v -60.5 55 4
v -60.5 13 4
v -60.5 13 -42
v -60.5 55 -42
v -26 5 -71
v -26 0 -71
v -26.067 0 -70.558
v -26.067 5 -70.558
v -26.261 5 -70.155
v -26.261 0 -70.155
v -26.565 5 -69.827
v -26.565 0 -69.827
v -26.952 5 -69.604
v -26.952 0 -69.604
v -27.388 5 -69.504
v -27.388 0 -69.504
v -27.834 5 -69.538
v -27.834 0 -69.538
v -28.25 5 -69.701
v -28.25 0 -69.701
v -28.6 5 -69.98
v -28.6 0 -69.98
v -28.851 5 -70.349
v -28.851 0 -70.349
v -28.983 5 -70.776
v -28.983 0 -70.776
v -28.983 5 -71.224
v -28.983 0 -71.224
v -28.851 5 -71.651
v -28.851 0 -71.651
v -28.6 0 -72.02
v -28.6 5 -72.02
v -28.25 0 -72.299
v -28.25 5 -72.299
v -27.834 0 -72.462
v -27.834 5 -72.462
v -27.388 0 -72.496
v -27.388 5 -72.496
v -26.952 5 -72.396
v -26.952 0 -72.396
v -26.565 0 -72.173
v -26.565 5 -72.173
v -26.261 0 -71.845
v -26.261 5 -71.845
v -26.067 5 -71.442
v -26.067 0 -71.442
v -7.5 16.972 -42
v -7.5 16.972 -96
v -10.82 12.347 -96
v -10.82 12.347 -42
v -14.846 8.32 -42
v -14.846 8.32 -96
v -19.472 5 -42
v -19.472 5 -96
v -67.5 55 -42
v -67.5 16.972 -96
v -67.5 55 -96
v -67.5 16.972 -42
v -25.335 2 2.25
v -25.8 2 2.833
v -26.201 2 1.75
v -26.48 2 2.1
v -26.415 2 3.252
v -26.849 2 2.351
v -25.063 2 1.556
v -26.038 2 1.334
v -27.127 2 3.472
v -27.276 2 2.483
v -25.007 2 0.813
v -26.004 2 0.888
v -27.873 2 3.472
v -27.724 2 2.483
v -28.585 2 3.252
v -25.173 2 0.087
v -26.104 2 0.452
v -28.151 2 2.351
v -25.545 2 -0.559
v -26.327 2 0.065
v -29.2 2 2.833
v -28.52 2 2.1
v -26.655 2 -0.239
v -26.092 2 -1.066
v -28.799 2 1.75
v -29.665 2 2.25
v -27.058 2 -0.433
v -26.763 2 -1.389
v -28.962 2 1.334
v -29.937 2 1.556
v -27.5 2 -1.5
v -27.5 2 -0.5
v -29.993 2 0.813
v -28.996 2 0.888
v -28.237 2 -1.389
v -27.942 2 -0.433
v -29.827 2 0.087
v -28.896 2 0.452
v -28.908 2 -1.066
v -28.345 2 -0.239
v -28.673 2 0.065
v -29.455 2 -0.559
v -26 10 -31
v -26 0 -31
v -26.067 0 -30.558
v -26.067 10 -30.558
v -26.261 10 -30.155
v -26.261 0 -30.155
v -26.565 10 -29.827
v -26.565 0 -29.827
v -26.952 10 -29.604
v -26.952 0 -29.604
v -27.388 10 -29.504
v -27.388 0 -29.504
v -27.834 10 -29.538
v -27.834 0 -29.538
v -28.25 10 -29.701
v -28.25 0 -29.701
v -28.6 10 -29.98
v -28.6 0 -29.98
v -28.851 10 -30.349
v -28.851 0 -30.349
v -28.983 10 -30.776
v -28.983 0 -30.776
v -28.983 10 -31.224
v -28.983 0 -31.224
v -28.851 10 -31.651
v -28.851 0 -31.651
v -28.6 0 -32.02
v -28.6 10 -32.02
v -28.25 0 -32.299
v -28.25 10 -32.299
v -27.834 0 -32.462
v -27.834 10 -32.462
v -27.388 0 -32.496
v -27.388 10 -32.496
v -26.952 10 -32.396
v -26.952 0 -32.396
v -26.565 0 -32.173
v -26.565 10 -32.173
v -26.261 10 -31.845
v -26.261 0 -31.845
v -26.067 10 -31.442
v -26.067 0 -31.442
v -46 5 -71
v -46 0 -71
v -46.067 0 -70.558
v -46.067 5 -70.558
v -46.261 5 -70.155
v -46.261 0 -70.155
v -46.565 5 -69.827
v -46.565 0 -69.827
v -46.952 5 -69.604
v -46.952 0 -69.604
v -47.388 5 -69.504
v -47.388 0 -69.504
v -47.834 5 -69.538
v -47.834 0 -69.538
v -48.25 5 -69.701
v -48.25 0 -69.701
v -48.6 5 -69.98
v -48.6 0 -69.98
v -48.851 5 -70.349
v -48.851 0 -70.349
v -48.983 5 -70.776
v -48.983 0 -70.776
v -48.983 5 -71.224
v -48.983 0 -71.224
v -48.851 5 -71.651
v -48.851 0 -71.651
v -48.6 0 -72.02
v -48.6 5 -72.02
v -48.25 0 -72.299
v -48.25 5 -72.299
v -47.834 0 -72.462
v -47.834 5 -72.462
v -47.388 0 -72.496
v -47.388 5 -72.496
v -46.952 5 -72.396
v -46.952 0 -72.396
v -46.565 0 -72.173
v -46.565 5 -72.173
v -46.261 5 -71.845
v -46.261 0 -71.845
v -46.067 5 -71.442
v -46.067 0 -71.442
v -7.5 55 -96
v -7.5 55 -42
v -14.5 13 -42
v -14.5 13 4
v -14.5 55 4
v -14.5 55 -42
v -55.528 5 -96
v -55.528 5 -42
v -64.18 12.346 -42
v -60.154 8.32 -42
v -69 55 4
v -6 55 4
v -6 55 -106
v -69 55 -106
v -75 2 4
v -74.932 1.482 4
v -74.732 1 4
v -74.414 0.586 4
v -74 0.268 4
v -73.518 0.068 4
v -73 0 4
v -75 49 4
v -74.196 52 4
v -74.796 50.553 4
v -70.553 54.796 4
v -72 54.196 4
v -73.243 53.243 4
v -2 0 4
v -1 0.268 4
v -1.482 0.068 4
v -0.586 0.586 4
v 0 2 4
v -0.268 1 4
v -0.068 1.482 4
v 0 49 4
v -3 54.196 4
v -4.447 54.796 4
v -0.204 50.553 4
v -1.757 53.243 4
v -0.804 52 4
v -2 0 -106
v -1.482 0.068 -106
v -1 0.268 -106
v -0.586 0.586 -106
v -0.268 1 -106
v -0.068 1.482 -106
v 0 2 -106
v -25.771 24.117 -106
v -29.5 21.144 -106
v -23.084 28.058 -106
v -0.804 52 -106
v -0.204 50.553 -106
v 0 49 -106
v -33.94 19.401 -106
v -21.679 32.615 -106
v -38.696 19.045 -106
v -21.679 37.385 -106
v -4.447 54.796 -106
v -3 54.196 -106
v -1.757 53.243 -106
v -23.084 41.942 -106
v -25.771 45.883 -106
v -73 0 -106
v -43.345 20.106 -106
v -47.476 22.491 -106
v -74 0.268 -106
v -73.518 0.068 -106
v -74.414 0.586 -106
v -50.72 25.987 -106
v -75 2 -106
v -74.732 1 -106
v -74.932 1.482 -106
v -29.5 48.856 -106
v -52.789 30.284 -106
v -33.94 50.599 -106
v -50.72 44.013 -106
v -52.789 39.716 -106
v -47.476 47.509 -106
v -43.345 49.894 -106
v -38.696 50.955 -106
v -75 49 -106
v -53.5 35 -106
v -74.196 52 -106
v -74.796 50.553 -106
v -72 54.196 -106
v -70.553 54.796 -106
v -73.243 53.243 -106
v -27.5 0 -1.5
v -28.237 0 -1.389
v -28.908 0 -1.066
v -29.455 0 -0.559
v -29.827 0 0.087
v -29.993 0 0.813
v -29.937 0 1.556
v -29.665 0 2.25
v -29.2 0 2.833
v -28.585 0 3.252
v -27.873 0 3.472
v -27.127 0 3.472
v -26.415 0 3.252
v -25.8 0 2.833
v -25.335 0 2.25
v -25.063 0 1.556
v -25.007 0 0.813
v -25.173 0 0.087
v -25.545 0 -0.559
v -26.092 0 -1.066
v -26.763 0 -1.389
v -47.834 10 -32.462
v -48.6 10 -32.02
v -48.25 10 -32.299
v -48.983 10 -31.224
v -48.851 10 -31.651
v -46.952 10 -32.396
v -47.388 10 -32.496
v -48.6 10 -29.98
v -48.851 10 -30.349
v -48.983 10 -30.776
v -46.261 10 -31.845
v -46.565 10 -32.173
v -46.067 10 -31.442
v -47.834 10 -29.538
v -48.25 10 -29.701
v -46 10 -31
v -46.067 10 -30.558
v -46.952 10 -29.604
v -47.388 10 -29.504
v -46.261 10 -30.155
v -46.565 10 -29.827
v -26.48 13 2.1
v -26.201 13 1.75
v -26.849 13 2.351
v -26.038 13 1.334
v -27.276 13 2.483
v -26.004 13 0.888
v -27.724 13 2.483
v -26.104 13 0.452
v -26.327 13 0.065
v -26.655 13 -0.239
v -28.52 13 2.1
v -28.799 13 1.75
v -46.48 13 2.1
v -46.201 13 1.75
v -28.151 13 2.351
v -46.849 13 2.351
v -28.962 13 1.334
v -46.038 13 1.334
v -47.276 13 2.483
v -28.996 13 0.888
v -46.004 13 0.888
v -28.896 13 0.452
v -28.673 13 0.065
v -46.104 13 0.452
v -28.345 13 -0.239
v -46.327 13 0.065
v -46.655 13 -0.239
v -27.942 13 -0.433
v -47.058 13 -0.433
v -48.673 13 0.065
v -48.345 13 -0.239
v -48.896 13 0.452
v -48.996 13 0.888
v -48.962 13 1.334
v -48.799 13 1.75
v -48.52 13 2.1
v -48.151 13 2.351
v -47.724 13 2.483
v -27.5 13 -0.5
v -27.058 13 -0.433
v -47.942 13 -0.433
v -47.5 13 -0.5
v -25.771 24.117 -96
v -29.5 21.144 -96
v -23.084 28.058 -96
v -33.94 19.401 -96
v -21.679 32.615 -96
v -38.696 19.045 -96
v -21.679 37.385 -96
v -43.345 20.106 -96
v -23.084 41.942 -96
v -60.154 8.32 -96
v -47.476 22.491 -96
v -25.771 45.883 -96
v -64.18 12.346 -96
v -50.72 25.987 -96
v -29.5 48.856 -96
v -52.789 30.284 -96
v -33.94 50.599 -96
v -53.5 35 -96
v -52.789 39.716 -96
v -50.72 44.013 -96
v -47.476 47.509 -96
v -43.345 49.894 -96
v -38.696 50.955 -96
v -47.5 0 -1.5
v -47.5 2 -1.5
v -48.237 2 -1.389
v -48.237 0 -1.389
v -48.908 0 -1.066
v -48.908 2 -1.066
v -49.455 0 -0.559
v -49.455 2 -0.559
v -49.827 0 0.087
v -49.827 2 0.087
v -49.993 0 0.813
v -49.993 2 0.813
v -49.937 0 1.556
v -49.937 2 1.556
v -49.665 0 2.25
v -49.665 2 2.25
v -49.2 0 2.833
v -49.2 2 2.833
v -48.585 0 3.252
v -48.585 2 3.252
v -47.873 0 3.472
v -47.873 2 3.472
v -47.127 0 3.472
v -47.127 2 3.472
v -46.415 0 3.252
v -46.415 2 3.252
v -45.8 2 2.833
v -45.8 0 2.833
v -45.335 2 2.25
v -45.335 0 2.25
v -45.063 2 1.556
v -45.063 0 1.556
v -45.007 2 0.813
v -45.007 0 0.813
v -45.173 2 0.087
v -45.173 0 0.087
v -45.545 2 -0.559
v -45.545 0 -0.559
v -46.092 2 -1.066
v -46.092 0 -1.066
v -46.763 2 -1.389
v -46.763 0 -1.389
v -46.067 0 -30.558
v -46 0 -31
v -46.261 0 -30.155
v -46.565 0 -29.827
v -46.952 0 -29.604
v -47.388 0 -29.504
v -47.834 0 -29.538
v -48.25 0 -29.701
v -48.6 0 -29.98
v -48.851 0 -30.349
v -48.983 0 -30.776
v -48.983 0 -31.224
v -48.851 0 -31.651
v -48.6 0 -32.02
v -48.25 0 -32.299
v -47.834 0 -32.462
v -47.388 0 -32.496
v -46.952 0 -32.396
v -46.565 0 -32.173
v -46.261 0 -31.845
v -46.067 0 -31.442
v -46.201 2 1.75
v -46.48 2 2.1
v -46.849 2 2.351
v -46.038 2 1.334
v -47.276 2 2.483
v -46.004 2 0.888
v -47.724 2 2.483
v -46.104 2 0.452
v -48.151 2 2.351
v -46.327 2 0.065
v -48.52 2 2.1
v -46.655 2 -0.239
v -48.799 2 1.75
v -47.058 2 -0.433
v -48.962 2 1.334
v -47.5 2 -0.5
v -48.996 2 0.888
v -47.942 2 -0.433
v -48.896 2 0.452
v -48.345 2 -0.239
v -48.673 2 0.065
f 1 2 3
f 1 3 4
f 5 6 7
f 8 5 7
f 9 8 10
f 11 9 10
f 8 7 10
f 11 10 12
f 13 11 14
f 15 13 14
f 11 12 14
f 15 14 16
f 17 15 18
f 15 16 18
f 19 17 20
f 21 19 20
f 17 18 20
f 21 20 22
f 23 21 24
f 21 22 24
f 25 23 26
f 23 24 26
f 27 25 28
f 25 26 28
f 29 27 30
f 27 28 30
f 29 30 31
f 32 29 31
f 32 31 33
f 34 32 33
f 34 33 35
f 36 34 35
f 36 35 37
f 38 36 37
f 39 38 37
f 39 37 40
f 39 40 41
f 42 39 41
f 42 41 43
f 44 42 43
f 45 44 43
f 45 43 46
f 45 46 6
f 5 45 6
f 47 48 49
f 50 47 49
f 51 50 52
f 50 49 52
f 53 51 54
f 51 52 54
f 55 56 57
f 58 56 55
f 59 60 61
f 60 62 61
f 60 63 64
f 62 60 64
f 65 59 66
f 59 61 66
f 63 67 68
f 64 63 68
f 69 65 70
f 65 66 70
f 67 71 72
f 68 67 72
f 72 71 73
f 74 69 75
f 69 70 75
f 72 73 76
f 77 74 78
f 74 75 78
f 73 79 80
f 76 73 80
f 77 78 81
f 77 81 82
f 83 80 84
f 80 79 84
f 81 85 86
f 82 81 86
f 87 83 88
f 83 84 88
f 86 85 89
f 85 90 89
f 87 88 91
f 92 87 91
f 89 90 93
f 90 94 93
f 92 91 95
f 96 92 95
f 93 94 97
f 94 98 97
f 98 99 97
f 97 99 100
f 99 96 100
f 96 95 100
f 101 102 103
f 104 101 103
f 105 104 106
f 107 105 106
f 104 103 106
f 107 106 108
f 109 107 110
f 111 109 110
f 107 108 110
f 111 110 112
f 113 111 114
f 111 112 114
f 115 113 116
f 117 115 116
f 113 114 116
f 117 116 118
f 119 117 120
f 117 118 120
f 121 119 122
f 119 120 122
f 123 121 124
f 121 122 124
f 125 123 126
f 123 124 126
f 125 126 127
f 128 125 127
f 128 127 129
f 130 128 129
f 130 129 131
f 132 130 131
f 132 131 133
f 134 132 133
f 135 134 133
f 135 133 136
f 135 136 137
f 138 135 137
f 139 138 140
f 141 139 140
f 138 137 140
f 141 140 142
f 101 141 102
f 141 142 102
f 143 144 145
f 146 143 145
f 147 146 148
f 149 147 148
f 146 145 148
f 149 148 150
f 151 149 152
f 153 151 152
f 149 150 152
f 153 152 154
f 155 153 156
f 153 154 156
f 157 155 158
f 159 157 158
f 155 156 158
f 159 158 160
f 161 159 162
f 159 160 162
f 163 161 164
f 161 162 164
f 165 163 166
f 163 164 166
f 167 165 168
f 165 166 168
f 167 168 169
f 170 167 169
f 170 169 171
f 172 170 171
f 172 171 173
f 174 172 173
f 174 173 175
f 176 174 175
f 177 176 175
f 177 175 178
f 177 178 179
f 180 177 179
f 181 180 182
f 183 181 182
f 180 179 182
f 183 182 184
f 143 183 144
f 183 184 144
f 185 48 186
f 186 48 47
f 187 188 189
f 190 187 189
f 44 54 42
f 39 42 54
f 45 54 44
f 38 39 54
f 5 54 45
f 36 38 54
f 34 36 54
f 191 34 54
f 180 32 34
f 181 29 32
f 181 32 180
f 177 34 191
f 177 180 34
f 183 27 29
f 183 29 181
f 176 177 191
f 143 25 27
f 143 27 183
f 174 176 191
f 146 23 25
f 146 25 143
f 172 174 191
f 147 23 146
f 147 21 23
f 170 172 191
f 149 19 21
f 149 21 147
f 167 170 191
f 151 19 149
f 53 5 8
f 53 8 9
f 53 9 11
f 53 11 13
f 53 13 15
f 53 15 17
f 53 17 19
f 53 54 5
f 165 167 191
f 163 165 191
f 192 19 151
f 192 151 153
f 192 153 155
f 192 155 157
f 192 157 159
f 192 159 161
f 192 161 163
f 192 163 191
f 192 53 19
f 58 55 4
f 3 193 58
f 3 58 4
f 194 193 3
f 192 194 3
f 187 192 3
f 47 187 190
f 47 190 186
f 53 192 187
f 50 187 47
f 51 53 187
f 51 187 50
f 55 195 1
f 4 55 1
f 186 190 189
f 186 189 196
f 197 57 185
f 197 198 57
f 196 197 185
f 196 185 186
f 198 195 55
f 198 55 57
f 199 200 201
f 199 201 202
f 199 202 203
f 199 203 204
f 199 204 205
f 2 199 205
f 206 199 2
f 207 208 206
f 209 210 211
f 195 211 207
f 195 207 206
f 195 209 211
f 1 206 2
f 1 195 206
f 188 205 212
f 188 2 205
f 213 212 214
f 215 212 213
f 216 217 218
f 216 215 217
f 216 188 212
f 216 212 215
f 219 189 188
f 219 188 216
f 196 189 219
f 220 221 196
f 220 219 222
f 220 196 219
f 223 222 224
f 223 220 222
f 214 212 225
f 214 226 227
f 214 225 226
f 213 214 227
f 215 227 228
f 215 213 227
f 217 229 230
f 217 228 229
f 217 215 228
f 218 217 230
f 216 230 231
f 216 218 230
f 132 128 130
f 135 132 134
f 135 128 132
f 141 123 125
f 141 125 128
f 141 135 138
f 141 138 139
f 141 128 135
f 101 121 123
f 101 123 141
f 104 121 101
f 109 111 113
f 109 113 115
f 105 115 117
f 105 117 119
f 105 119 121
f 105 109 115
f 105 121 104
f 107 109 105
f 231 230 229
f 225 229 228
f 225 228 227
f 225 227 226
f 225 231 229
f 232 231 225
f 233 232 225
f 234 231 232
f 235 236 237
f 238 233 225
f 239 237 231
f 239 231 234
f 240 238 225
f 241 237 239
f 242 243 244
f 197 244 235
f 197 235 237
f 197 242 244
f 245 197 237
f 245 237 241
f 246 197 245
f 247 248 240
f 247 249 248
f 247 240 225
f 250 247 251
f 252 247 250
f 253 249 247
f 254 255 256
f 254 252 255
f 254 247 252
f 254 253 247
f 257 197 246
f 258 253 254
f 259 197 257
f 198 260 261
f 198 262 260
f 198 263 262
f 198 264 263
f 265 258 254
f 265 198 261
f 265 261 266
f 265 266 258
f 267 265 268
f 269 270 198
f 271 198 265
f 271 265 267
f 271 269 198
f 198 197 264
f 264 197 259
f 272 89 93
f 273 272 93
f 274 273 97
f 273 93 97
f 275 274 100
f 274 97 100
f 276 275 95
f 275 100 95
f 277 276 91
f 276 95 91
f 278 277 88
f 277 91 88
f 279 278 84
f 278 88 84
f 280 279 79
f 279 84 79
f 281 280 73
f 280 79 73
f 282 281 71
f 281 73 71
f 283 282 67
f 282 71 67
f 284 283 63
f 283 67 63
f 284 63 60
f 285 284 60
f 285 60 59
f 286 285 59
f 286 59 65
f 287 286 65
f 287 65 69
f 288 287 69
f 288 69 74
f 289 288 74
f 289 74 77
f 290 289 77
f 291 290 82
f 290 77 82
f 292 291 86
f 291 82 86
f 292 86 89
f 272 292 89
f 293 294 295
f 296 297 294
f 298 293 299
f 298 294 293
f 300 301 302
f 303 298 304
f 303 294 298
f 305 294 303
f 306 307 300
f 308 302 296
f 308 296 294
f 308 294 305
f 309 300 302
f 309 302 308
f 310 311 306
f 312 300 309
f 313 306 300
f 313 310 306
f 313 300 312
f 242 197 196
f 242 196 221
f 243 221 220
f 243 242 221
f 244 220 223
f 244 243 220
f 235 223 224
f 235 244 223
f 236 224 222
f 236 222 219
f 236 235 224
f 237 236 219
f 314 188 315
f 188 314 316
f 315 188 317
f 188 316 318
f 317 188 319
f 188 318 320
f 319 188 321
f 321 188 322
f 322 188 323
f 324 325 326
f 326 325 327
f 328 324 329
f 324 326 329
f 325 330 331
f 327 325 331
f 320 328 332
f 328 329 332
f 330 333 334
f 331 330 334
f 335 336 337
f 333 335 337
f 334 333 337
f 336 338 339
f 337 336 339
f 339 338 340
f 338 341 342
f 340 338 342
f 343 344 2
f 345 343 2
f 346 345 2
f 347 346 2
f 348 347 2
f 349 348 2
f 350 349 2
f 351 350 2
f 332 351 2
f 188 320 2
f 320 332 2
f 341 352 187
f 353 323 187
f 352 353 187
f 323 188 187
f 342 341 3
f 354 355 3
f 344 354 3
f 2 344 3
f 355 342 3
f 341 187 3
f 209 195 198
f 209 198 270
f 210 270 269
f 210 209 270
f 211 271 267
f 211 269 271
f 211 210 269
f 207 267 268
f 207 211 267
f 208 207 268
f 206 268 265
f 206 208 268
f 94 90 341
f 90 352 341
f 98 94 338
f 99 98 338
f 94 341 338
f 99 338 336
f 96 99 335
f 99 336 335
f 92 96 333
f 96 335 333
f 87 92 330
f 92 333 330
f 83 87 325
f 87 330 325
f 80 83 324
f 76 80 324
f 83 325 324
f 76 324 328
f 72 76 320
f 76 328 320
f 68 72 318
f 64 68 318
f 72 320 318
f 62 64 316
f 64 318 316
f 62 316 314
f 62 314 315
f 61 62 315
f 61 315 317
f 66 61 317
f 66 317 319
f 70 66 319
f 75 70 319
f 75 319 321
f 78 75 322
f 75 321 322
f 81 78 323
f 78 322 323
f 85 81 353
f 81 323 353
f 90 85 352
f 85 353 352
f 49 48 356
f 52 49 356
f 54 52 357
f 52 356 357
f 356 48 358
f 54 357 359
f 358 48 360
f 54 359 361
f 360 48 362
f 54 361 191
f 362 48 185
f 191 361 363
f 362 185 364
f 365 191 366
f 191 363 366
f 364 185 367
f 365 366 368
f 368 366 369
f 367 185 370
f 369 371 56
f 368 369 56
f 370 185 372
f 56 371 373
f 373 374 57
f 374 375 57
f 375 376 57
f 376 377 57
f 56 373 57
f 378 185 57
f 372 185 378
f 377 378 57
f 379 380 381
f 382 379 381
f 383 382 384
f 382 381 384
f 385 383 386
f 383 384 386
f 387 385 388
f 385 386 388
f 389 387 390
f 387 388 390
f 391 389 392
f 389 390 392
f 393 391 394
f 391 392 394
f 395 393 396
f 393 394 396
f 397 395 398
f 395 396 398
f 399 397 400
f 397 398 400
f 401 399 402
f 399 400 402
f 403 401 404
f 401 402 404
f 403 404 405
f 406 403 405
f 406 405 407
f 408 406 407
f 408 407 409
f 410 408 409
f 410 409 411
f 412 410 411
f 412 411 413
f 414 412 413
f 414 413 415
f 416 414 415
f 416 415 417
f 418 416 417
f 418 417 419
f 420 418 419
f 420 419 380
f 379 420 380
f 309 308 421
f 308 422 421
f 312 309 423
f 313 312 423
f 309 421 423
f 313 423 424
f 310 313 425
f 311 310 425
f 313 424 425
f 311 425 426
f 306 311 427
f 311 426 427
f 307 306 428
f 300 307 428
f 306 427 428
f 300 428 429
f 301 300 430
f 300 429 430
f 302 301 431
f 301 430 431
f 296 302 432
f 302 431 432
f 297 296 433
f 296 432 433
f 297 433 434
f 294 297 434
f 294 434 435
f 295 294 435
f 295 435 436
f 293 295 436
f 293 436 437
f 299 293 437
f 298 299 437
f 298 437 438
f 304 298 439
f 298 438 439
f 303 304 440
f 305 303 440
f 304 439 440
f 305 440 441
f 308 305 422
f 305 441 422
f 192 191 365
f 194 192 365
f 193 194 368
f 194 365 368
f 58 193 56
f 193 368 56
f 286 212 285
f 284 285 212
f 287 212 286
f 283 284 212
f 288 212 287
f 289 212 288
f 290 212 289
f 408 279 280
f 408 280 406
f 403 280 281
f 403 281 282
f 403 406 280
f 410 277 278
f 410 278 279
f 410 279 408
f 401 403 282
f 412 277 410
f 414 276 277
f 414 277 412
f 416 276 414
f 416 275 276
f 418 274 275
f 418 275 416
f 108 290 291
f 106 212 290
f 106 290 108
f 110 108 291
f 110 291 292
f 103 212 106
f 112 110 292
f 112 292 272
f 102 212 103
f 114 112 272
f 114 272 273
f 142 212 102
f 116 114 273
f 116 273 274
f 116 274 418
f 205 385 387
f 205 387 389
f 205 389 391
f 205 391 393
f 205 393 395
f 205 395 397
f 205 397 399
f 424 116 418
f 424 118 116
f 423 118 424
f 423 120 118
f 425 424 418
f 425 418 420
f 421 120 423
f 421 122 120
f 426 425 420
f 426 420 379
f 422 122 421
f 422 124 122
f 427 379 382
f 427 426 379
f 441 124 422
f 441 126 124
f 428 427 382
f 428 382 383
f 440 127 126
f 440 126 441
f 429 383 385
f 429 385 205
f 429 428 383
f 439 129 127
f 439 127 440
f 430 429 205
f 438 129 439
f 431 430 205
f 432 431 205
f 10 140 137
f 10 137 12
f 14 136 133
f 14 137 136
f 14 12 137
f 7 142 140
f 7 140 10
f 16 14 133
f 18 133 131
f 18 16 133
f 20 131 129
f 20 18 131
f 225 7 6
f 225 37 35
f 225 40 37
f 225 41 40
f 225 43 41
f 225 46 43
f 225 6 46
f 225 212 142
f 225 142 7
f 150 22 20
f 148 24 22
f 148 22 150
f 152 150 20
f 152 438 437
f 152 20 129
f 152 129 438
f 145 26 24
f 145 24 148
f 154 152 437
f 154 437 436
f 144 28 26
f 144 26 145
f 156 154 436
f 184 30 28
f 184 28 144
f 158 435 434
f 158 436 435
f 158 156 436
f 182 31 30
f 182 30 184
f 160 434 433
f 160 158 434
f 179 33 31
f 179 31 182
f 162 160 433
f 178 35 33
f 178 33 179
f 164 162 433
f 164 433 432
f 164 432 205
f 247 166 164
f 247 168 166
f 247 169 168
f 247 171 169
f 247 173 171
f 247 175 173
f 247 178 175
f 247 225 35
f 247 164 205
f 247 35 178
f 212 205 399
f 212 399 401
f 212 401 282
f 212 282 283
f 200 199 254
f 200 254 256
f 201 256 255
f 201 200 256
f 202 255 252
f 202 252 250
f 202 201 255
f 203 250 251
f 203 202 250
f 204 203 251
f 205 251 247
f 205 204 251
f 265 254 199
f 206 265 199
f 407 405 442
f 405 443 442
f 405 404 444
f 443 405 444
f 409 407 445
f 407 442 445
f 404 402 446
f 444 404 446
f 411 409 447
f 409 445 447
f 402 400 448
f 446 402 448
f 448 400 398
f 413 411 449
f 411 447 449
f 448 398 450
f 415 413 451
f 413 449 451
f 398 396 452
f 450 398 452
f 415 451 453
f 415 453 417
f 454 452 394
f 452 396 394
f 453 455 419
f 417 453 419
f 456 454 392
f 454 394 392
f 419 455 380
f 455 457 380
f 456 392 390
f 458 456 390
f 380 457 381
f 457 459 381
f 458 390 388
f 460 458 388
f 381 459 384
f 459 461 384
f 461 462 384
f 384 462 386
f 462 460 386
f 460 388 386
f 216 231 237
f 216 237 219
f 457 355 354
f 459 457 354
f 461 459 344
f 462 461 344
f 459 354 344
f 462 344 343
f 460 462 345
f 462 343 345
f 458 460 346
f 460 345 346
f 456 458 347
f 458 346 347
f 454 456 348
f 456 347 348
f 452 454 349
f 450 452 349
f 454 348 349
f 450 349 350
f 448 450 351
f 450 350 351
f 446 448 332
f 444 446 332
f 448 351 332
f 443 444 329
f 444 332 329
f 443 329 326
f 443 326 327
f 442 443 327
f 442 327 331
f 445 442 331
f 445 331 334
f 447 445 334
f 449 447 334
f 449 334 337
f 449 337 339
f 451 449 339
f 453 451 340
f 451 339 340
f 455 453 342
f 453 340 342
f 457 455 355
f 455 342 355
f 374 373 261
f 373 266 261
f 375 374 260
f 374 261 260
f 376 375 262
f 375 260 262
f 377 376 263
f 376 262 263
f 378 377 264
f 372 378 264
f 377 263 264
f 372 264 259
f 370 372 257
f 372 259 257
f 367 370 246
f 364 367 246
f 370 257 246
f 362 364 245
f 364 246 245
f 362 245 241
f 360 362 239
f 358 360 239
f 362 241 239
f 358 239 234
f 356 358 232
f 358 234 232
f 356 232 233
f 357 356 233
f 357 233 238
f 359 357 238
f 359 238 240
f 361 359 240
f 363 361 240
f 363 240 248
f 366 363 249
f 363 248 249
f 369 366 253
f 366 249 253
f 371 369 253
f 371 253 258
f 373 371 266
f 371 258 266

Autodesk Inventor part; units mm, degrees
ref_plane "YZ Plane" through (0, 0, 0) normal (1, 0, 0) x (0, 1, 0)
ref_plane "XZ Plane" through (0, 0, 0) normal (0, 1, 0) x (-1, 0, 0)
ref_plane "XY Plane" through (0, 0, 0) normal (0, 0, 1) x (1, 0, 0)
sketch "Sketch1" plane through (0, 0, 0) normal (0, 1, 0) x (-1, 0, 0)
  line L0 (0, 0) -> (75, 0)
  line L1 (75, 0) -> (75, -91)
  line L2 (75, -91) -> (0, -91)
  line L3 (0, -91) -> (0, 0)
  dimension "d0" = 75
  dimension "d1" = 91
extrude "Extrusion1" add sketch "Sketch1" along normal blind 5
sketch "Sketch2" plane through (0, 5, 0) normal (0, 1, 0) x (1, 0, 0)
  line L0 (-14.5, 42) -> (0, 42)
  line L1 (0, 0) -> (0, 91) projected
  line L2 (0, 42) -> (0, 0)
  line L3 (0, 0) -> (-14.5, 0)
  line L4 (0, 91) -> (-75, 91) projected
  line L5 (-60.5, 42) -> (-75, 42)
  line L6 (-75, 42) -> (-75, 0)
  line L7 (-75, 0) -> (-60.5, 0)
  line L8 (-60.5, 42) -> (-14.5, 42)
  line L9 (-14.5, 0) -> (-60.5, 0)
  line L10 (-75, 0) -> (0, 0) projected
extrude "Extrusion2" add sketch "Sketch2" along normal blind 8
sketch "Sketch3" plane through (0, 0, -91) normal (0, 0, -1) x (-1, 0, 0)
  line L0 (0, 5) -> (75, 5) projected
  line L1 (75, 0) -> (0, 0) projected
  line L2 (0, 5) -> (75, 5)
  line L3 (75, 5) -> (75, 0)
  line L4 (75, 0) -> (0, 0)
  line L5 (0, 0) -> (0, 5)
extrude "Extrusion3" add sketch "Sketch3" along normal blind 15
sketch "Sketch4" plane through (0, 13, 0) normal (0, 1, 0) x (1, 0, 0)
  line L0 (-14.5, 0) -> (-14.5, 42)
  line L1 (0, 42) -> (-75, 42) projected
  line L2 (-60.5, 0) -> (-60.5, 42)
  line L3 (-75, 0) -> (0, 0) projected
  line L4 (0, 0) -> (-14.5, 0)
  line L5 (-14.5, 0) -> (-14.5, 42)
  line L6 (-14.5, 42) -> (0, 42)
  line L7 (0, 42) -> (0, 0)
  line L8 (-60.5, 42) -> (-75, 42)
  line L9 (-75, 42) -> (-75, 0)
  line L10 (-75, 0) -> (-60.5, 0)
  line L11 (-60.5, 0) -> (-60.5, 42)
extrude "Extrusion4" add sketch "Sketch4" along normal blind 42 contours L0 L1 L7 L3 | L3 L9 L1 L2
sketch "Sketch5" plane through (0, 0, -106) normal (0, 0, -1) x (-1, 0, 0)
  line L0 (75, 5) -> (0, 5) projected
  line L1 (37.5, 5) -> (19.472, 5)
  line L2 (19.472, 5) -> (55.528, 5)
  line L3 (37.5, 5) -> (37.5, 35)
  line L4 (75, 0) -> (75, 55) projected
  line L5 (0, 5) -> (0, 55) projected
  line L6 (37.5, 35) -> (7.5, 35)
  line L7 (67.5, 35) -> (67.5, 16.972)
  line L8 (67.5, 35) -> (67.5, 53.028)
  arc A0 (55.528, 5) -> (67.5, 16.972) centre (37.5001, 34.9999) ccw
  line L9 (7.5, 35) -> (7.5, 53.028)
  line L10 (7.5, 35) -> (7.5, 16.9723)
  arc A1 (7.5, 16.9723) -> (19.472, 5) centre (37.5014, 35.001) ccw
  line L11 (67.5, 53.028) -> (75, 53.028)
  line L12 (75, 0) -> (0, 0) projected
  line L13 (75, 53.028) -> (75, 0)
  line L14 (75, 0) -> (0, 0)
  line L15 (0, 0) -> (0, 53.028)
  line L16 (7.5, 53.028) -> (0, 53.028)
  dimension "d18" = 18.028
  dimension "d19" = 36.056
  dimension "d20" = 30
  dimension "d21" = 30
  dimension "d22" = 30
  dimension "d23" = 18.028
  dimension "d24" = 18.028
  dimension "d25" = 35
extrude "Extrusion5" add sketch "Sketch5" against normal up to surface (64 mm away) contours L0 A0 L7 L8 L11 L4 | L0 L5 L16 L9 L10 A1
sketch "Sketch6" plane through (-75, 0, 0) normal (0, 0, 1) x (1, 0, 0)
  line L0 (0, 0) -> (0, 55) projected
  line L1 (75, 0) -> (0, 0) projected
  line L2 (0, 55) -> (0, 0)
  line L3 (0, 0) -> (75, 0)
  line L4 (75, 53.028) -> (75, 55) projected
  line L5 (75, 0) -> (75, 55)
  line L6 (75, 55) -> (60.5, 55) projected
  line L7 (75, 55) -> (60.5, 55)
  line L8 (60.5, 13) -> (60.5, 55) projected
  line L9 (60.5, 55) -> (60.5, 13)
  line L10 (60.5, 13) -> (14.5, 13) projected
  line L11 (60.5, 13) -> (14.5, 13)
  line L12 (14.5, 13) -> (14.5, 55) projected
  line L13 (14.5, 13) -> (14.5, 55)
  line L14 (14.5, 55) -> (0, 55)
extrude "Extrusion6" add sketch "Sketch6" along normal blind 4
sketch "Sketch8" plane through (0, 0, 0) normal (0, -1, 0) x (1, 0, 0)
  line L0 (-14.5, 4) -> (-60.5, 4) projected
  point P0 (0, 0)
  point P1 (-27.5, 1)
  point P2 (-47.5, 1)
hole "Hole2" at (-27.5, 0, 1) at (-47.5, 0, 1) direction (0, 1, 0) diameter 3 end through all counterbore diameter 5 counterbore depth 2
sketch "Sketch9" plane through (0, 55, 0) normal (0, 1, 0) x (1, 0, 0)
  point P0 (0, 0)
sketch "Sketch10" plane through (0, 5, 0) normal (0, 1, 0) x (1, 0, 0)
  line L0 (-67.5, 106) -> (-67.5, 42) projected
  line L1 (-7.5, 106) -> (-67.5, 106)
  line L2 (-67.5, 106) -> (-67.5, 96)
  line L3 (-67.5, 96) -> (-7.5, 96)
  line L4 (-7.5, 106) -> (-7.5, 42) projected
  line L5 (-7.5, 96) -> (-7.5, 106)
  point P0 (0, 0)
  dimension "d50" = 10
extrude "Extrusion7" add sketch "Sketch10" along normal up to surface (48.028 mm away)
sketch "Sketch11" plane through (0, 0, -106) normal (0, 0, -1) x (-1, 0, 0)
  line L0 (55.528, 5) -> (19.472, 5) projected
  circle A0 centre (37.5, 35) radius 16.5
  point P0 (0, 0)
  dimension "d56" = 33
extrude "Extrusion8" cut sketch "Sketch11" against normal through all
sketch "Sketch12" plane through (-75, 53.028, -106) normal (0, 1, 0) x (1, 0, 0)
  line L0 (75, -64) -> (67.5, -64) projected
  line L1 (75, 0) -> (75, -64) projected
  line L2 (75, -64) -> (75, 0)
  line L3 (75, 0) -> (0, 0) projected
  line L4 (75, 0) -> (0, 0)
  line L5 (7.5, -64) -> (0, -64) projected
  line L6 (0, 0) -> (0, -64)
  line L7 (7.5, -10) -> (7.5, -64) projected
  line L8 (0, -64) -> (7.5, -64)
  line L9 (7.5, -64) -> (7.5, -10)
  line L10 (67.5, -10) -> (7.5, -10) projected
  line L11 (7.5, -10) -> (67.5, -10)
  line L12 (67.5, -10) -> (67.5, -64) projected
  line L13 (67.5, -10) -> (67.5, -64)
  line L14 (67.5, -64) -> (75, -64)
  point P0 (75, -106)
extrude "Extrusion9" add sketch "Sketch12" along normal up to surface (1.972 mm away)
fillet "Fillet2" radius 2 2 edges at (0, 0, -51) (-75, 0, -51)
fillet "Fillet3" radius 6 2 edges at (0, 55, -51) (-75, 55, -51)
sketch "Sketch13" plane through (0, 0, 0) normal (0, -1, 0) x (1, 0, 0)
  line L0 (-2, 4) -> (-2, -106) projected
  line L1 (-73, -106) -> (-73, 4) projected
  circle A0 centre (-27.5, -31) radius 1.5
  circle A1 centre (-47.5, -31) radius 1.5
  circle A2 centre (-47.5, -71) radius 1.5
  circle A3 centre (-27.5, -71) radius 1.5
  point P0 (0, 0)
  dimension "d68" = 3
extrude "Extrusion10" cut sketch "Sketch13" against normal blind 10
sketch "Sketch14" plane through (0, 0, -106) normal (0, 0, -1) x (-1, 0, 0)
  circle A0 centre (37.5, 35) radius 16.5 projected
  circle A1 centre (37.5, 35) radius 16
  point P0 (0, 0)
  dimension "d71" = 32
extrude "Extrusion11" add sketch "Sketch14" against normal up to surface (10 mm away)
properties part number "Motor_Mount"
